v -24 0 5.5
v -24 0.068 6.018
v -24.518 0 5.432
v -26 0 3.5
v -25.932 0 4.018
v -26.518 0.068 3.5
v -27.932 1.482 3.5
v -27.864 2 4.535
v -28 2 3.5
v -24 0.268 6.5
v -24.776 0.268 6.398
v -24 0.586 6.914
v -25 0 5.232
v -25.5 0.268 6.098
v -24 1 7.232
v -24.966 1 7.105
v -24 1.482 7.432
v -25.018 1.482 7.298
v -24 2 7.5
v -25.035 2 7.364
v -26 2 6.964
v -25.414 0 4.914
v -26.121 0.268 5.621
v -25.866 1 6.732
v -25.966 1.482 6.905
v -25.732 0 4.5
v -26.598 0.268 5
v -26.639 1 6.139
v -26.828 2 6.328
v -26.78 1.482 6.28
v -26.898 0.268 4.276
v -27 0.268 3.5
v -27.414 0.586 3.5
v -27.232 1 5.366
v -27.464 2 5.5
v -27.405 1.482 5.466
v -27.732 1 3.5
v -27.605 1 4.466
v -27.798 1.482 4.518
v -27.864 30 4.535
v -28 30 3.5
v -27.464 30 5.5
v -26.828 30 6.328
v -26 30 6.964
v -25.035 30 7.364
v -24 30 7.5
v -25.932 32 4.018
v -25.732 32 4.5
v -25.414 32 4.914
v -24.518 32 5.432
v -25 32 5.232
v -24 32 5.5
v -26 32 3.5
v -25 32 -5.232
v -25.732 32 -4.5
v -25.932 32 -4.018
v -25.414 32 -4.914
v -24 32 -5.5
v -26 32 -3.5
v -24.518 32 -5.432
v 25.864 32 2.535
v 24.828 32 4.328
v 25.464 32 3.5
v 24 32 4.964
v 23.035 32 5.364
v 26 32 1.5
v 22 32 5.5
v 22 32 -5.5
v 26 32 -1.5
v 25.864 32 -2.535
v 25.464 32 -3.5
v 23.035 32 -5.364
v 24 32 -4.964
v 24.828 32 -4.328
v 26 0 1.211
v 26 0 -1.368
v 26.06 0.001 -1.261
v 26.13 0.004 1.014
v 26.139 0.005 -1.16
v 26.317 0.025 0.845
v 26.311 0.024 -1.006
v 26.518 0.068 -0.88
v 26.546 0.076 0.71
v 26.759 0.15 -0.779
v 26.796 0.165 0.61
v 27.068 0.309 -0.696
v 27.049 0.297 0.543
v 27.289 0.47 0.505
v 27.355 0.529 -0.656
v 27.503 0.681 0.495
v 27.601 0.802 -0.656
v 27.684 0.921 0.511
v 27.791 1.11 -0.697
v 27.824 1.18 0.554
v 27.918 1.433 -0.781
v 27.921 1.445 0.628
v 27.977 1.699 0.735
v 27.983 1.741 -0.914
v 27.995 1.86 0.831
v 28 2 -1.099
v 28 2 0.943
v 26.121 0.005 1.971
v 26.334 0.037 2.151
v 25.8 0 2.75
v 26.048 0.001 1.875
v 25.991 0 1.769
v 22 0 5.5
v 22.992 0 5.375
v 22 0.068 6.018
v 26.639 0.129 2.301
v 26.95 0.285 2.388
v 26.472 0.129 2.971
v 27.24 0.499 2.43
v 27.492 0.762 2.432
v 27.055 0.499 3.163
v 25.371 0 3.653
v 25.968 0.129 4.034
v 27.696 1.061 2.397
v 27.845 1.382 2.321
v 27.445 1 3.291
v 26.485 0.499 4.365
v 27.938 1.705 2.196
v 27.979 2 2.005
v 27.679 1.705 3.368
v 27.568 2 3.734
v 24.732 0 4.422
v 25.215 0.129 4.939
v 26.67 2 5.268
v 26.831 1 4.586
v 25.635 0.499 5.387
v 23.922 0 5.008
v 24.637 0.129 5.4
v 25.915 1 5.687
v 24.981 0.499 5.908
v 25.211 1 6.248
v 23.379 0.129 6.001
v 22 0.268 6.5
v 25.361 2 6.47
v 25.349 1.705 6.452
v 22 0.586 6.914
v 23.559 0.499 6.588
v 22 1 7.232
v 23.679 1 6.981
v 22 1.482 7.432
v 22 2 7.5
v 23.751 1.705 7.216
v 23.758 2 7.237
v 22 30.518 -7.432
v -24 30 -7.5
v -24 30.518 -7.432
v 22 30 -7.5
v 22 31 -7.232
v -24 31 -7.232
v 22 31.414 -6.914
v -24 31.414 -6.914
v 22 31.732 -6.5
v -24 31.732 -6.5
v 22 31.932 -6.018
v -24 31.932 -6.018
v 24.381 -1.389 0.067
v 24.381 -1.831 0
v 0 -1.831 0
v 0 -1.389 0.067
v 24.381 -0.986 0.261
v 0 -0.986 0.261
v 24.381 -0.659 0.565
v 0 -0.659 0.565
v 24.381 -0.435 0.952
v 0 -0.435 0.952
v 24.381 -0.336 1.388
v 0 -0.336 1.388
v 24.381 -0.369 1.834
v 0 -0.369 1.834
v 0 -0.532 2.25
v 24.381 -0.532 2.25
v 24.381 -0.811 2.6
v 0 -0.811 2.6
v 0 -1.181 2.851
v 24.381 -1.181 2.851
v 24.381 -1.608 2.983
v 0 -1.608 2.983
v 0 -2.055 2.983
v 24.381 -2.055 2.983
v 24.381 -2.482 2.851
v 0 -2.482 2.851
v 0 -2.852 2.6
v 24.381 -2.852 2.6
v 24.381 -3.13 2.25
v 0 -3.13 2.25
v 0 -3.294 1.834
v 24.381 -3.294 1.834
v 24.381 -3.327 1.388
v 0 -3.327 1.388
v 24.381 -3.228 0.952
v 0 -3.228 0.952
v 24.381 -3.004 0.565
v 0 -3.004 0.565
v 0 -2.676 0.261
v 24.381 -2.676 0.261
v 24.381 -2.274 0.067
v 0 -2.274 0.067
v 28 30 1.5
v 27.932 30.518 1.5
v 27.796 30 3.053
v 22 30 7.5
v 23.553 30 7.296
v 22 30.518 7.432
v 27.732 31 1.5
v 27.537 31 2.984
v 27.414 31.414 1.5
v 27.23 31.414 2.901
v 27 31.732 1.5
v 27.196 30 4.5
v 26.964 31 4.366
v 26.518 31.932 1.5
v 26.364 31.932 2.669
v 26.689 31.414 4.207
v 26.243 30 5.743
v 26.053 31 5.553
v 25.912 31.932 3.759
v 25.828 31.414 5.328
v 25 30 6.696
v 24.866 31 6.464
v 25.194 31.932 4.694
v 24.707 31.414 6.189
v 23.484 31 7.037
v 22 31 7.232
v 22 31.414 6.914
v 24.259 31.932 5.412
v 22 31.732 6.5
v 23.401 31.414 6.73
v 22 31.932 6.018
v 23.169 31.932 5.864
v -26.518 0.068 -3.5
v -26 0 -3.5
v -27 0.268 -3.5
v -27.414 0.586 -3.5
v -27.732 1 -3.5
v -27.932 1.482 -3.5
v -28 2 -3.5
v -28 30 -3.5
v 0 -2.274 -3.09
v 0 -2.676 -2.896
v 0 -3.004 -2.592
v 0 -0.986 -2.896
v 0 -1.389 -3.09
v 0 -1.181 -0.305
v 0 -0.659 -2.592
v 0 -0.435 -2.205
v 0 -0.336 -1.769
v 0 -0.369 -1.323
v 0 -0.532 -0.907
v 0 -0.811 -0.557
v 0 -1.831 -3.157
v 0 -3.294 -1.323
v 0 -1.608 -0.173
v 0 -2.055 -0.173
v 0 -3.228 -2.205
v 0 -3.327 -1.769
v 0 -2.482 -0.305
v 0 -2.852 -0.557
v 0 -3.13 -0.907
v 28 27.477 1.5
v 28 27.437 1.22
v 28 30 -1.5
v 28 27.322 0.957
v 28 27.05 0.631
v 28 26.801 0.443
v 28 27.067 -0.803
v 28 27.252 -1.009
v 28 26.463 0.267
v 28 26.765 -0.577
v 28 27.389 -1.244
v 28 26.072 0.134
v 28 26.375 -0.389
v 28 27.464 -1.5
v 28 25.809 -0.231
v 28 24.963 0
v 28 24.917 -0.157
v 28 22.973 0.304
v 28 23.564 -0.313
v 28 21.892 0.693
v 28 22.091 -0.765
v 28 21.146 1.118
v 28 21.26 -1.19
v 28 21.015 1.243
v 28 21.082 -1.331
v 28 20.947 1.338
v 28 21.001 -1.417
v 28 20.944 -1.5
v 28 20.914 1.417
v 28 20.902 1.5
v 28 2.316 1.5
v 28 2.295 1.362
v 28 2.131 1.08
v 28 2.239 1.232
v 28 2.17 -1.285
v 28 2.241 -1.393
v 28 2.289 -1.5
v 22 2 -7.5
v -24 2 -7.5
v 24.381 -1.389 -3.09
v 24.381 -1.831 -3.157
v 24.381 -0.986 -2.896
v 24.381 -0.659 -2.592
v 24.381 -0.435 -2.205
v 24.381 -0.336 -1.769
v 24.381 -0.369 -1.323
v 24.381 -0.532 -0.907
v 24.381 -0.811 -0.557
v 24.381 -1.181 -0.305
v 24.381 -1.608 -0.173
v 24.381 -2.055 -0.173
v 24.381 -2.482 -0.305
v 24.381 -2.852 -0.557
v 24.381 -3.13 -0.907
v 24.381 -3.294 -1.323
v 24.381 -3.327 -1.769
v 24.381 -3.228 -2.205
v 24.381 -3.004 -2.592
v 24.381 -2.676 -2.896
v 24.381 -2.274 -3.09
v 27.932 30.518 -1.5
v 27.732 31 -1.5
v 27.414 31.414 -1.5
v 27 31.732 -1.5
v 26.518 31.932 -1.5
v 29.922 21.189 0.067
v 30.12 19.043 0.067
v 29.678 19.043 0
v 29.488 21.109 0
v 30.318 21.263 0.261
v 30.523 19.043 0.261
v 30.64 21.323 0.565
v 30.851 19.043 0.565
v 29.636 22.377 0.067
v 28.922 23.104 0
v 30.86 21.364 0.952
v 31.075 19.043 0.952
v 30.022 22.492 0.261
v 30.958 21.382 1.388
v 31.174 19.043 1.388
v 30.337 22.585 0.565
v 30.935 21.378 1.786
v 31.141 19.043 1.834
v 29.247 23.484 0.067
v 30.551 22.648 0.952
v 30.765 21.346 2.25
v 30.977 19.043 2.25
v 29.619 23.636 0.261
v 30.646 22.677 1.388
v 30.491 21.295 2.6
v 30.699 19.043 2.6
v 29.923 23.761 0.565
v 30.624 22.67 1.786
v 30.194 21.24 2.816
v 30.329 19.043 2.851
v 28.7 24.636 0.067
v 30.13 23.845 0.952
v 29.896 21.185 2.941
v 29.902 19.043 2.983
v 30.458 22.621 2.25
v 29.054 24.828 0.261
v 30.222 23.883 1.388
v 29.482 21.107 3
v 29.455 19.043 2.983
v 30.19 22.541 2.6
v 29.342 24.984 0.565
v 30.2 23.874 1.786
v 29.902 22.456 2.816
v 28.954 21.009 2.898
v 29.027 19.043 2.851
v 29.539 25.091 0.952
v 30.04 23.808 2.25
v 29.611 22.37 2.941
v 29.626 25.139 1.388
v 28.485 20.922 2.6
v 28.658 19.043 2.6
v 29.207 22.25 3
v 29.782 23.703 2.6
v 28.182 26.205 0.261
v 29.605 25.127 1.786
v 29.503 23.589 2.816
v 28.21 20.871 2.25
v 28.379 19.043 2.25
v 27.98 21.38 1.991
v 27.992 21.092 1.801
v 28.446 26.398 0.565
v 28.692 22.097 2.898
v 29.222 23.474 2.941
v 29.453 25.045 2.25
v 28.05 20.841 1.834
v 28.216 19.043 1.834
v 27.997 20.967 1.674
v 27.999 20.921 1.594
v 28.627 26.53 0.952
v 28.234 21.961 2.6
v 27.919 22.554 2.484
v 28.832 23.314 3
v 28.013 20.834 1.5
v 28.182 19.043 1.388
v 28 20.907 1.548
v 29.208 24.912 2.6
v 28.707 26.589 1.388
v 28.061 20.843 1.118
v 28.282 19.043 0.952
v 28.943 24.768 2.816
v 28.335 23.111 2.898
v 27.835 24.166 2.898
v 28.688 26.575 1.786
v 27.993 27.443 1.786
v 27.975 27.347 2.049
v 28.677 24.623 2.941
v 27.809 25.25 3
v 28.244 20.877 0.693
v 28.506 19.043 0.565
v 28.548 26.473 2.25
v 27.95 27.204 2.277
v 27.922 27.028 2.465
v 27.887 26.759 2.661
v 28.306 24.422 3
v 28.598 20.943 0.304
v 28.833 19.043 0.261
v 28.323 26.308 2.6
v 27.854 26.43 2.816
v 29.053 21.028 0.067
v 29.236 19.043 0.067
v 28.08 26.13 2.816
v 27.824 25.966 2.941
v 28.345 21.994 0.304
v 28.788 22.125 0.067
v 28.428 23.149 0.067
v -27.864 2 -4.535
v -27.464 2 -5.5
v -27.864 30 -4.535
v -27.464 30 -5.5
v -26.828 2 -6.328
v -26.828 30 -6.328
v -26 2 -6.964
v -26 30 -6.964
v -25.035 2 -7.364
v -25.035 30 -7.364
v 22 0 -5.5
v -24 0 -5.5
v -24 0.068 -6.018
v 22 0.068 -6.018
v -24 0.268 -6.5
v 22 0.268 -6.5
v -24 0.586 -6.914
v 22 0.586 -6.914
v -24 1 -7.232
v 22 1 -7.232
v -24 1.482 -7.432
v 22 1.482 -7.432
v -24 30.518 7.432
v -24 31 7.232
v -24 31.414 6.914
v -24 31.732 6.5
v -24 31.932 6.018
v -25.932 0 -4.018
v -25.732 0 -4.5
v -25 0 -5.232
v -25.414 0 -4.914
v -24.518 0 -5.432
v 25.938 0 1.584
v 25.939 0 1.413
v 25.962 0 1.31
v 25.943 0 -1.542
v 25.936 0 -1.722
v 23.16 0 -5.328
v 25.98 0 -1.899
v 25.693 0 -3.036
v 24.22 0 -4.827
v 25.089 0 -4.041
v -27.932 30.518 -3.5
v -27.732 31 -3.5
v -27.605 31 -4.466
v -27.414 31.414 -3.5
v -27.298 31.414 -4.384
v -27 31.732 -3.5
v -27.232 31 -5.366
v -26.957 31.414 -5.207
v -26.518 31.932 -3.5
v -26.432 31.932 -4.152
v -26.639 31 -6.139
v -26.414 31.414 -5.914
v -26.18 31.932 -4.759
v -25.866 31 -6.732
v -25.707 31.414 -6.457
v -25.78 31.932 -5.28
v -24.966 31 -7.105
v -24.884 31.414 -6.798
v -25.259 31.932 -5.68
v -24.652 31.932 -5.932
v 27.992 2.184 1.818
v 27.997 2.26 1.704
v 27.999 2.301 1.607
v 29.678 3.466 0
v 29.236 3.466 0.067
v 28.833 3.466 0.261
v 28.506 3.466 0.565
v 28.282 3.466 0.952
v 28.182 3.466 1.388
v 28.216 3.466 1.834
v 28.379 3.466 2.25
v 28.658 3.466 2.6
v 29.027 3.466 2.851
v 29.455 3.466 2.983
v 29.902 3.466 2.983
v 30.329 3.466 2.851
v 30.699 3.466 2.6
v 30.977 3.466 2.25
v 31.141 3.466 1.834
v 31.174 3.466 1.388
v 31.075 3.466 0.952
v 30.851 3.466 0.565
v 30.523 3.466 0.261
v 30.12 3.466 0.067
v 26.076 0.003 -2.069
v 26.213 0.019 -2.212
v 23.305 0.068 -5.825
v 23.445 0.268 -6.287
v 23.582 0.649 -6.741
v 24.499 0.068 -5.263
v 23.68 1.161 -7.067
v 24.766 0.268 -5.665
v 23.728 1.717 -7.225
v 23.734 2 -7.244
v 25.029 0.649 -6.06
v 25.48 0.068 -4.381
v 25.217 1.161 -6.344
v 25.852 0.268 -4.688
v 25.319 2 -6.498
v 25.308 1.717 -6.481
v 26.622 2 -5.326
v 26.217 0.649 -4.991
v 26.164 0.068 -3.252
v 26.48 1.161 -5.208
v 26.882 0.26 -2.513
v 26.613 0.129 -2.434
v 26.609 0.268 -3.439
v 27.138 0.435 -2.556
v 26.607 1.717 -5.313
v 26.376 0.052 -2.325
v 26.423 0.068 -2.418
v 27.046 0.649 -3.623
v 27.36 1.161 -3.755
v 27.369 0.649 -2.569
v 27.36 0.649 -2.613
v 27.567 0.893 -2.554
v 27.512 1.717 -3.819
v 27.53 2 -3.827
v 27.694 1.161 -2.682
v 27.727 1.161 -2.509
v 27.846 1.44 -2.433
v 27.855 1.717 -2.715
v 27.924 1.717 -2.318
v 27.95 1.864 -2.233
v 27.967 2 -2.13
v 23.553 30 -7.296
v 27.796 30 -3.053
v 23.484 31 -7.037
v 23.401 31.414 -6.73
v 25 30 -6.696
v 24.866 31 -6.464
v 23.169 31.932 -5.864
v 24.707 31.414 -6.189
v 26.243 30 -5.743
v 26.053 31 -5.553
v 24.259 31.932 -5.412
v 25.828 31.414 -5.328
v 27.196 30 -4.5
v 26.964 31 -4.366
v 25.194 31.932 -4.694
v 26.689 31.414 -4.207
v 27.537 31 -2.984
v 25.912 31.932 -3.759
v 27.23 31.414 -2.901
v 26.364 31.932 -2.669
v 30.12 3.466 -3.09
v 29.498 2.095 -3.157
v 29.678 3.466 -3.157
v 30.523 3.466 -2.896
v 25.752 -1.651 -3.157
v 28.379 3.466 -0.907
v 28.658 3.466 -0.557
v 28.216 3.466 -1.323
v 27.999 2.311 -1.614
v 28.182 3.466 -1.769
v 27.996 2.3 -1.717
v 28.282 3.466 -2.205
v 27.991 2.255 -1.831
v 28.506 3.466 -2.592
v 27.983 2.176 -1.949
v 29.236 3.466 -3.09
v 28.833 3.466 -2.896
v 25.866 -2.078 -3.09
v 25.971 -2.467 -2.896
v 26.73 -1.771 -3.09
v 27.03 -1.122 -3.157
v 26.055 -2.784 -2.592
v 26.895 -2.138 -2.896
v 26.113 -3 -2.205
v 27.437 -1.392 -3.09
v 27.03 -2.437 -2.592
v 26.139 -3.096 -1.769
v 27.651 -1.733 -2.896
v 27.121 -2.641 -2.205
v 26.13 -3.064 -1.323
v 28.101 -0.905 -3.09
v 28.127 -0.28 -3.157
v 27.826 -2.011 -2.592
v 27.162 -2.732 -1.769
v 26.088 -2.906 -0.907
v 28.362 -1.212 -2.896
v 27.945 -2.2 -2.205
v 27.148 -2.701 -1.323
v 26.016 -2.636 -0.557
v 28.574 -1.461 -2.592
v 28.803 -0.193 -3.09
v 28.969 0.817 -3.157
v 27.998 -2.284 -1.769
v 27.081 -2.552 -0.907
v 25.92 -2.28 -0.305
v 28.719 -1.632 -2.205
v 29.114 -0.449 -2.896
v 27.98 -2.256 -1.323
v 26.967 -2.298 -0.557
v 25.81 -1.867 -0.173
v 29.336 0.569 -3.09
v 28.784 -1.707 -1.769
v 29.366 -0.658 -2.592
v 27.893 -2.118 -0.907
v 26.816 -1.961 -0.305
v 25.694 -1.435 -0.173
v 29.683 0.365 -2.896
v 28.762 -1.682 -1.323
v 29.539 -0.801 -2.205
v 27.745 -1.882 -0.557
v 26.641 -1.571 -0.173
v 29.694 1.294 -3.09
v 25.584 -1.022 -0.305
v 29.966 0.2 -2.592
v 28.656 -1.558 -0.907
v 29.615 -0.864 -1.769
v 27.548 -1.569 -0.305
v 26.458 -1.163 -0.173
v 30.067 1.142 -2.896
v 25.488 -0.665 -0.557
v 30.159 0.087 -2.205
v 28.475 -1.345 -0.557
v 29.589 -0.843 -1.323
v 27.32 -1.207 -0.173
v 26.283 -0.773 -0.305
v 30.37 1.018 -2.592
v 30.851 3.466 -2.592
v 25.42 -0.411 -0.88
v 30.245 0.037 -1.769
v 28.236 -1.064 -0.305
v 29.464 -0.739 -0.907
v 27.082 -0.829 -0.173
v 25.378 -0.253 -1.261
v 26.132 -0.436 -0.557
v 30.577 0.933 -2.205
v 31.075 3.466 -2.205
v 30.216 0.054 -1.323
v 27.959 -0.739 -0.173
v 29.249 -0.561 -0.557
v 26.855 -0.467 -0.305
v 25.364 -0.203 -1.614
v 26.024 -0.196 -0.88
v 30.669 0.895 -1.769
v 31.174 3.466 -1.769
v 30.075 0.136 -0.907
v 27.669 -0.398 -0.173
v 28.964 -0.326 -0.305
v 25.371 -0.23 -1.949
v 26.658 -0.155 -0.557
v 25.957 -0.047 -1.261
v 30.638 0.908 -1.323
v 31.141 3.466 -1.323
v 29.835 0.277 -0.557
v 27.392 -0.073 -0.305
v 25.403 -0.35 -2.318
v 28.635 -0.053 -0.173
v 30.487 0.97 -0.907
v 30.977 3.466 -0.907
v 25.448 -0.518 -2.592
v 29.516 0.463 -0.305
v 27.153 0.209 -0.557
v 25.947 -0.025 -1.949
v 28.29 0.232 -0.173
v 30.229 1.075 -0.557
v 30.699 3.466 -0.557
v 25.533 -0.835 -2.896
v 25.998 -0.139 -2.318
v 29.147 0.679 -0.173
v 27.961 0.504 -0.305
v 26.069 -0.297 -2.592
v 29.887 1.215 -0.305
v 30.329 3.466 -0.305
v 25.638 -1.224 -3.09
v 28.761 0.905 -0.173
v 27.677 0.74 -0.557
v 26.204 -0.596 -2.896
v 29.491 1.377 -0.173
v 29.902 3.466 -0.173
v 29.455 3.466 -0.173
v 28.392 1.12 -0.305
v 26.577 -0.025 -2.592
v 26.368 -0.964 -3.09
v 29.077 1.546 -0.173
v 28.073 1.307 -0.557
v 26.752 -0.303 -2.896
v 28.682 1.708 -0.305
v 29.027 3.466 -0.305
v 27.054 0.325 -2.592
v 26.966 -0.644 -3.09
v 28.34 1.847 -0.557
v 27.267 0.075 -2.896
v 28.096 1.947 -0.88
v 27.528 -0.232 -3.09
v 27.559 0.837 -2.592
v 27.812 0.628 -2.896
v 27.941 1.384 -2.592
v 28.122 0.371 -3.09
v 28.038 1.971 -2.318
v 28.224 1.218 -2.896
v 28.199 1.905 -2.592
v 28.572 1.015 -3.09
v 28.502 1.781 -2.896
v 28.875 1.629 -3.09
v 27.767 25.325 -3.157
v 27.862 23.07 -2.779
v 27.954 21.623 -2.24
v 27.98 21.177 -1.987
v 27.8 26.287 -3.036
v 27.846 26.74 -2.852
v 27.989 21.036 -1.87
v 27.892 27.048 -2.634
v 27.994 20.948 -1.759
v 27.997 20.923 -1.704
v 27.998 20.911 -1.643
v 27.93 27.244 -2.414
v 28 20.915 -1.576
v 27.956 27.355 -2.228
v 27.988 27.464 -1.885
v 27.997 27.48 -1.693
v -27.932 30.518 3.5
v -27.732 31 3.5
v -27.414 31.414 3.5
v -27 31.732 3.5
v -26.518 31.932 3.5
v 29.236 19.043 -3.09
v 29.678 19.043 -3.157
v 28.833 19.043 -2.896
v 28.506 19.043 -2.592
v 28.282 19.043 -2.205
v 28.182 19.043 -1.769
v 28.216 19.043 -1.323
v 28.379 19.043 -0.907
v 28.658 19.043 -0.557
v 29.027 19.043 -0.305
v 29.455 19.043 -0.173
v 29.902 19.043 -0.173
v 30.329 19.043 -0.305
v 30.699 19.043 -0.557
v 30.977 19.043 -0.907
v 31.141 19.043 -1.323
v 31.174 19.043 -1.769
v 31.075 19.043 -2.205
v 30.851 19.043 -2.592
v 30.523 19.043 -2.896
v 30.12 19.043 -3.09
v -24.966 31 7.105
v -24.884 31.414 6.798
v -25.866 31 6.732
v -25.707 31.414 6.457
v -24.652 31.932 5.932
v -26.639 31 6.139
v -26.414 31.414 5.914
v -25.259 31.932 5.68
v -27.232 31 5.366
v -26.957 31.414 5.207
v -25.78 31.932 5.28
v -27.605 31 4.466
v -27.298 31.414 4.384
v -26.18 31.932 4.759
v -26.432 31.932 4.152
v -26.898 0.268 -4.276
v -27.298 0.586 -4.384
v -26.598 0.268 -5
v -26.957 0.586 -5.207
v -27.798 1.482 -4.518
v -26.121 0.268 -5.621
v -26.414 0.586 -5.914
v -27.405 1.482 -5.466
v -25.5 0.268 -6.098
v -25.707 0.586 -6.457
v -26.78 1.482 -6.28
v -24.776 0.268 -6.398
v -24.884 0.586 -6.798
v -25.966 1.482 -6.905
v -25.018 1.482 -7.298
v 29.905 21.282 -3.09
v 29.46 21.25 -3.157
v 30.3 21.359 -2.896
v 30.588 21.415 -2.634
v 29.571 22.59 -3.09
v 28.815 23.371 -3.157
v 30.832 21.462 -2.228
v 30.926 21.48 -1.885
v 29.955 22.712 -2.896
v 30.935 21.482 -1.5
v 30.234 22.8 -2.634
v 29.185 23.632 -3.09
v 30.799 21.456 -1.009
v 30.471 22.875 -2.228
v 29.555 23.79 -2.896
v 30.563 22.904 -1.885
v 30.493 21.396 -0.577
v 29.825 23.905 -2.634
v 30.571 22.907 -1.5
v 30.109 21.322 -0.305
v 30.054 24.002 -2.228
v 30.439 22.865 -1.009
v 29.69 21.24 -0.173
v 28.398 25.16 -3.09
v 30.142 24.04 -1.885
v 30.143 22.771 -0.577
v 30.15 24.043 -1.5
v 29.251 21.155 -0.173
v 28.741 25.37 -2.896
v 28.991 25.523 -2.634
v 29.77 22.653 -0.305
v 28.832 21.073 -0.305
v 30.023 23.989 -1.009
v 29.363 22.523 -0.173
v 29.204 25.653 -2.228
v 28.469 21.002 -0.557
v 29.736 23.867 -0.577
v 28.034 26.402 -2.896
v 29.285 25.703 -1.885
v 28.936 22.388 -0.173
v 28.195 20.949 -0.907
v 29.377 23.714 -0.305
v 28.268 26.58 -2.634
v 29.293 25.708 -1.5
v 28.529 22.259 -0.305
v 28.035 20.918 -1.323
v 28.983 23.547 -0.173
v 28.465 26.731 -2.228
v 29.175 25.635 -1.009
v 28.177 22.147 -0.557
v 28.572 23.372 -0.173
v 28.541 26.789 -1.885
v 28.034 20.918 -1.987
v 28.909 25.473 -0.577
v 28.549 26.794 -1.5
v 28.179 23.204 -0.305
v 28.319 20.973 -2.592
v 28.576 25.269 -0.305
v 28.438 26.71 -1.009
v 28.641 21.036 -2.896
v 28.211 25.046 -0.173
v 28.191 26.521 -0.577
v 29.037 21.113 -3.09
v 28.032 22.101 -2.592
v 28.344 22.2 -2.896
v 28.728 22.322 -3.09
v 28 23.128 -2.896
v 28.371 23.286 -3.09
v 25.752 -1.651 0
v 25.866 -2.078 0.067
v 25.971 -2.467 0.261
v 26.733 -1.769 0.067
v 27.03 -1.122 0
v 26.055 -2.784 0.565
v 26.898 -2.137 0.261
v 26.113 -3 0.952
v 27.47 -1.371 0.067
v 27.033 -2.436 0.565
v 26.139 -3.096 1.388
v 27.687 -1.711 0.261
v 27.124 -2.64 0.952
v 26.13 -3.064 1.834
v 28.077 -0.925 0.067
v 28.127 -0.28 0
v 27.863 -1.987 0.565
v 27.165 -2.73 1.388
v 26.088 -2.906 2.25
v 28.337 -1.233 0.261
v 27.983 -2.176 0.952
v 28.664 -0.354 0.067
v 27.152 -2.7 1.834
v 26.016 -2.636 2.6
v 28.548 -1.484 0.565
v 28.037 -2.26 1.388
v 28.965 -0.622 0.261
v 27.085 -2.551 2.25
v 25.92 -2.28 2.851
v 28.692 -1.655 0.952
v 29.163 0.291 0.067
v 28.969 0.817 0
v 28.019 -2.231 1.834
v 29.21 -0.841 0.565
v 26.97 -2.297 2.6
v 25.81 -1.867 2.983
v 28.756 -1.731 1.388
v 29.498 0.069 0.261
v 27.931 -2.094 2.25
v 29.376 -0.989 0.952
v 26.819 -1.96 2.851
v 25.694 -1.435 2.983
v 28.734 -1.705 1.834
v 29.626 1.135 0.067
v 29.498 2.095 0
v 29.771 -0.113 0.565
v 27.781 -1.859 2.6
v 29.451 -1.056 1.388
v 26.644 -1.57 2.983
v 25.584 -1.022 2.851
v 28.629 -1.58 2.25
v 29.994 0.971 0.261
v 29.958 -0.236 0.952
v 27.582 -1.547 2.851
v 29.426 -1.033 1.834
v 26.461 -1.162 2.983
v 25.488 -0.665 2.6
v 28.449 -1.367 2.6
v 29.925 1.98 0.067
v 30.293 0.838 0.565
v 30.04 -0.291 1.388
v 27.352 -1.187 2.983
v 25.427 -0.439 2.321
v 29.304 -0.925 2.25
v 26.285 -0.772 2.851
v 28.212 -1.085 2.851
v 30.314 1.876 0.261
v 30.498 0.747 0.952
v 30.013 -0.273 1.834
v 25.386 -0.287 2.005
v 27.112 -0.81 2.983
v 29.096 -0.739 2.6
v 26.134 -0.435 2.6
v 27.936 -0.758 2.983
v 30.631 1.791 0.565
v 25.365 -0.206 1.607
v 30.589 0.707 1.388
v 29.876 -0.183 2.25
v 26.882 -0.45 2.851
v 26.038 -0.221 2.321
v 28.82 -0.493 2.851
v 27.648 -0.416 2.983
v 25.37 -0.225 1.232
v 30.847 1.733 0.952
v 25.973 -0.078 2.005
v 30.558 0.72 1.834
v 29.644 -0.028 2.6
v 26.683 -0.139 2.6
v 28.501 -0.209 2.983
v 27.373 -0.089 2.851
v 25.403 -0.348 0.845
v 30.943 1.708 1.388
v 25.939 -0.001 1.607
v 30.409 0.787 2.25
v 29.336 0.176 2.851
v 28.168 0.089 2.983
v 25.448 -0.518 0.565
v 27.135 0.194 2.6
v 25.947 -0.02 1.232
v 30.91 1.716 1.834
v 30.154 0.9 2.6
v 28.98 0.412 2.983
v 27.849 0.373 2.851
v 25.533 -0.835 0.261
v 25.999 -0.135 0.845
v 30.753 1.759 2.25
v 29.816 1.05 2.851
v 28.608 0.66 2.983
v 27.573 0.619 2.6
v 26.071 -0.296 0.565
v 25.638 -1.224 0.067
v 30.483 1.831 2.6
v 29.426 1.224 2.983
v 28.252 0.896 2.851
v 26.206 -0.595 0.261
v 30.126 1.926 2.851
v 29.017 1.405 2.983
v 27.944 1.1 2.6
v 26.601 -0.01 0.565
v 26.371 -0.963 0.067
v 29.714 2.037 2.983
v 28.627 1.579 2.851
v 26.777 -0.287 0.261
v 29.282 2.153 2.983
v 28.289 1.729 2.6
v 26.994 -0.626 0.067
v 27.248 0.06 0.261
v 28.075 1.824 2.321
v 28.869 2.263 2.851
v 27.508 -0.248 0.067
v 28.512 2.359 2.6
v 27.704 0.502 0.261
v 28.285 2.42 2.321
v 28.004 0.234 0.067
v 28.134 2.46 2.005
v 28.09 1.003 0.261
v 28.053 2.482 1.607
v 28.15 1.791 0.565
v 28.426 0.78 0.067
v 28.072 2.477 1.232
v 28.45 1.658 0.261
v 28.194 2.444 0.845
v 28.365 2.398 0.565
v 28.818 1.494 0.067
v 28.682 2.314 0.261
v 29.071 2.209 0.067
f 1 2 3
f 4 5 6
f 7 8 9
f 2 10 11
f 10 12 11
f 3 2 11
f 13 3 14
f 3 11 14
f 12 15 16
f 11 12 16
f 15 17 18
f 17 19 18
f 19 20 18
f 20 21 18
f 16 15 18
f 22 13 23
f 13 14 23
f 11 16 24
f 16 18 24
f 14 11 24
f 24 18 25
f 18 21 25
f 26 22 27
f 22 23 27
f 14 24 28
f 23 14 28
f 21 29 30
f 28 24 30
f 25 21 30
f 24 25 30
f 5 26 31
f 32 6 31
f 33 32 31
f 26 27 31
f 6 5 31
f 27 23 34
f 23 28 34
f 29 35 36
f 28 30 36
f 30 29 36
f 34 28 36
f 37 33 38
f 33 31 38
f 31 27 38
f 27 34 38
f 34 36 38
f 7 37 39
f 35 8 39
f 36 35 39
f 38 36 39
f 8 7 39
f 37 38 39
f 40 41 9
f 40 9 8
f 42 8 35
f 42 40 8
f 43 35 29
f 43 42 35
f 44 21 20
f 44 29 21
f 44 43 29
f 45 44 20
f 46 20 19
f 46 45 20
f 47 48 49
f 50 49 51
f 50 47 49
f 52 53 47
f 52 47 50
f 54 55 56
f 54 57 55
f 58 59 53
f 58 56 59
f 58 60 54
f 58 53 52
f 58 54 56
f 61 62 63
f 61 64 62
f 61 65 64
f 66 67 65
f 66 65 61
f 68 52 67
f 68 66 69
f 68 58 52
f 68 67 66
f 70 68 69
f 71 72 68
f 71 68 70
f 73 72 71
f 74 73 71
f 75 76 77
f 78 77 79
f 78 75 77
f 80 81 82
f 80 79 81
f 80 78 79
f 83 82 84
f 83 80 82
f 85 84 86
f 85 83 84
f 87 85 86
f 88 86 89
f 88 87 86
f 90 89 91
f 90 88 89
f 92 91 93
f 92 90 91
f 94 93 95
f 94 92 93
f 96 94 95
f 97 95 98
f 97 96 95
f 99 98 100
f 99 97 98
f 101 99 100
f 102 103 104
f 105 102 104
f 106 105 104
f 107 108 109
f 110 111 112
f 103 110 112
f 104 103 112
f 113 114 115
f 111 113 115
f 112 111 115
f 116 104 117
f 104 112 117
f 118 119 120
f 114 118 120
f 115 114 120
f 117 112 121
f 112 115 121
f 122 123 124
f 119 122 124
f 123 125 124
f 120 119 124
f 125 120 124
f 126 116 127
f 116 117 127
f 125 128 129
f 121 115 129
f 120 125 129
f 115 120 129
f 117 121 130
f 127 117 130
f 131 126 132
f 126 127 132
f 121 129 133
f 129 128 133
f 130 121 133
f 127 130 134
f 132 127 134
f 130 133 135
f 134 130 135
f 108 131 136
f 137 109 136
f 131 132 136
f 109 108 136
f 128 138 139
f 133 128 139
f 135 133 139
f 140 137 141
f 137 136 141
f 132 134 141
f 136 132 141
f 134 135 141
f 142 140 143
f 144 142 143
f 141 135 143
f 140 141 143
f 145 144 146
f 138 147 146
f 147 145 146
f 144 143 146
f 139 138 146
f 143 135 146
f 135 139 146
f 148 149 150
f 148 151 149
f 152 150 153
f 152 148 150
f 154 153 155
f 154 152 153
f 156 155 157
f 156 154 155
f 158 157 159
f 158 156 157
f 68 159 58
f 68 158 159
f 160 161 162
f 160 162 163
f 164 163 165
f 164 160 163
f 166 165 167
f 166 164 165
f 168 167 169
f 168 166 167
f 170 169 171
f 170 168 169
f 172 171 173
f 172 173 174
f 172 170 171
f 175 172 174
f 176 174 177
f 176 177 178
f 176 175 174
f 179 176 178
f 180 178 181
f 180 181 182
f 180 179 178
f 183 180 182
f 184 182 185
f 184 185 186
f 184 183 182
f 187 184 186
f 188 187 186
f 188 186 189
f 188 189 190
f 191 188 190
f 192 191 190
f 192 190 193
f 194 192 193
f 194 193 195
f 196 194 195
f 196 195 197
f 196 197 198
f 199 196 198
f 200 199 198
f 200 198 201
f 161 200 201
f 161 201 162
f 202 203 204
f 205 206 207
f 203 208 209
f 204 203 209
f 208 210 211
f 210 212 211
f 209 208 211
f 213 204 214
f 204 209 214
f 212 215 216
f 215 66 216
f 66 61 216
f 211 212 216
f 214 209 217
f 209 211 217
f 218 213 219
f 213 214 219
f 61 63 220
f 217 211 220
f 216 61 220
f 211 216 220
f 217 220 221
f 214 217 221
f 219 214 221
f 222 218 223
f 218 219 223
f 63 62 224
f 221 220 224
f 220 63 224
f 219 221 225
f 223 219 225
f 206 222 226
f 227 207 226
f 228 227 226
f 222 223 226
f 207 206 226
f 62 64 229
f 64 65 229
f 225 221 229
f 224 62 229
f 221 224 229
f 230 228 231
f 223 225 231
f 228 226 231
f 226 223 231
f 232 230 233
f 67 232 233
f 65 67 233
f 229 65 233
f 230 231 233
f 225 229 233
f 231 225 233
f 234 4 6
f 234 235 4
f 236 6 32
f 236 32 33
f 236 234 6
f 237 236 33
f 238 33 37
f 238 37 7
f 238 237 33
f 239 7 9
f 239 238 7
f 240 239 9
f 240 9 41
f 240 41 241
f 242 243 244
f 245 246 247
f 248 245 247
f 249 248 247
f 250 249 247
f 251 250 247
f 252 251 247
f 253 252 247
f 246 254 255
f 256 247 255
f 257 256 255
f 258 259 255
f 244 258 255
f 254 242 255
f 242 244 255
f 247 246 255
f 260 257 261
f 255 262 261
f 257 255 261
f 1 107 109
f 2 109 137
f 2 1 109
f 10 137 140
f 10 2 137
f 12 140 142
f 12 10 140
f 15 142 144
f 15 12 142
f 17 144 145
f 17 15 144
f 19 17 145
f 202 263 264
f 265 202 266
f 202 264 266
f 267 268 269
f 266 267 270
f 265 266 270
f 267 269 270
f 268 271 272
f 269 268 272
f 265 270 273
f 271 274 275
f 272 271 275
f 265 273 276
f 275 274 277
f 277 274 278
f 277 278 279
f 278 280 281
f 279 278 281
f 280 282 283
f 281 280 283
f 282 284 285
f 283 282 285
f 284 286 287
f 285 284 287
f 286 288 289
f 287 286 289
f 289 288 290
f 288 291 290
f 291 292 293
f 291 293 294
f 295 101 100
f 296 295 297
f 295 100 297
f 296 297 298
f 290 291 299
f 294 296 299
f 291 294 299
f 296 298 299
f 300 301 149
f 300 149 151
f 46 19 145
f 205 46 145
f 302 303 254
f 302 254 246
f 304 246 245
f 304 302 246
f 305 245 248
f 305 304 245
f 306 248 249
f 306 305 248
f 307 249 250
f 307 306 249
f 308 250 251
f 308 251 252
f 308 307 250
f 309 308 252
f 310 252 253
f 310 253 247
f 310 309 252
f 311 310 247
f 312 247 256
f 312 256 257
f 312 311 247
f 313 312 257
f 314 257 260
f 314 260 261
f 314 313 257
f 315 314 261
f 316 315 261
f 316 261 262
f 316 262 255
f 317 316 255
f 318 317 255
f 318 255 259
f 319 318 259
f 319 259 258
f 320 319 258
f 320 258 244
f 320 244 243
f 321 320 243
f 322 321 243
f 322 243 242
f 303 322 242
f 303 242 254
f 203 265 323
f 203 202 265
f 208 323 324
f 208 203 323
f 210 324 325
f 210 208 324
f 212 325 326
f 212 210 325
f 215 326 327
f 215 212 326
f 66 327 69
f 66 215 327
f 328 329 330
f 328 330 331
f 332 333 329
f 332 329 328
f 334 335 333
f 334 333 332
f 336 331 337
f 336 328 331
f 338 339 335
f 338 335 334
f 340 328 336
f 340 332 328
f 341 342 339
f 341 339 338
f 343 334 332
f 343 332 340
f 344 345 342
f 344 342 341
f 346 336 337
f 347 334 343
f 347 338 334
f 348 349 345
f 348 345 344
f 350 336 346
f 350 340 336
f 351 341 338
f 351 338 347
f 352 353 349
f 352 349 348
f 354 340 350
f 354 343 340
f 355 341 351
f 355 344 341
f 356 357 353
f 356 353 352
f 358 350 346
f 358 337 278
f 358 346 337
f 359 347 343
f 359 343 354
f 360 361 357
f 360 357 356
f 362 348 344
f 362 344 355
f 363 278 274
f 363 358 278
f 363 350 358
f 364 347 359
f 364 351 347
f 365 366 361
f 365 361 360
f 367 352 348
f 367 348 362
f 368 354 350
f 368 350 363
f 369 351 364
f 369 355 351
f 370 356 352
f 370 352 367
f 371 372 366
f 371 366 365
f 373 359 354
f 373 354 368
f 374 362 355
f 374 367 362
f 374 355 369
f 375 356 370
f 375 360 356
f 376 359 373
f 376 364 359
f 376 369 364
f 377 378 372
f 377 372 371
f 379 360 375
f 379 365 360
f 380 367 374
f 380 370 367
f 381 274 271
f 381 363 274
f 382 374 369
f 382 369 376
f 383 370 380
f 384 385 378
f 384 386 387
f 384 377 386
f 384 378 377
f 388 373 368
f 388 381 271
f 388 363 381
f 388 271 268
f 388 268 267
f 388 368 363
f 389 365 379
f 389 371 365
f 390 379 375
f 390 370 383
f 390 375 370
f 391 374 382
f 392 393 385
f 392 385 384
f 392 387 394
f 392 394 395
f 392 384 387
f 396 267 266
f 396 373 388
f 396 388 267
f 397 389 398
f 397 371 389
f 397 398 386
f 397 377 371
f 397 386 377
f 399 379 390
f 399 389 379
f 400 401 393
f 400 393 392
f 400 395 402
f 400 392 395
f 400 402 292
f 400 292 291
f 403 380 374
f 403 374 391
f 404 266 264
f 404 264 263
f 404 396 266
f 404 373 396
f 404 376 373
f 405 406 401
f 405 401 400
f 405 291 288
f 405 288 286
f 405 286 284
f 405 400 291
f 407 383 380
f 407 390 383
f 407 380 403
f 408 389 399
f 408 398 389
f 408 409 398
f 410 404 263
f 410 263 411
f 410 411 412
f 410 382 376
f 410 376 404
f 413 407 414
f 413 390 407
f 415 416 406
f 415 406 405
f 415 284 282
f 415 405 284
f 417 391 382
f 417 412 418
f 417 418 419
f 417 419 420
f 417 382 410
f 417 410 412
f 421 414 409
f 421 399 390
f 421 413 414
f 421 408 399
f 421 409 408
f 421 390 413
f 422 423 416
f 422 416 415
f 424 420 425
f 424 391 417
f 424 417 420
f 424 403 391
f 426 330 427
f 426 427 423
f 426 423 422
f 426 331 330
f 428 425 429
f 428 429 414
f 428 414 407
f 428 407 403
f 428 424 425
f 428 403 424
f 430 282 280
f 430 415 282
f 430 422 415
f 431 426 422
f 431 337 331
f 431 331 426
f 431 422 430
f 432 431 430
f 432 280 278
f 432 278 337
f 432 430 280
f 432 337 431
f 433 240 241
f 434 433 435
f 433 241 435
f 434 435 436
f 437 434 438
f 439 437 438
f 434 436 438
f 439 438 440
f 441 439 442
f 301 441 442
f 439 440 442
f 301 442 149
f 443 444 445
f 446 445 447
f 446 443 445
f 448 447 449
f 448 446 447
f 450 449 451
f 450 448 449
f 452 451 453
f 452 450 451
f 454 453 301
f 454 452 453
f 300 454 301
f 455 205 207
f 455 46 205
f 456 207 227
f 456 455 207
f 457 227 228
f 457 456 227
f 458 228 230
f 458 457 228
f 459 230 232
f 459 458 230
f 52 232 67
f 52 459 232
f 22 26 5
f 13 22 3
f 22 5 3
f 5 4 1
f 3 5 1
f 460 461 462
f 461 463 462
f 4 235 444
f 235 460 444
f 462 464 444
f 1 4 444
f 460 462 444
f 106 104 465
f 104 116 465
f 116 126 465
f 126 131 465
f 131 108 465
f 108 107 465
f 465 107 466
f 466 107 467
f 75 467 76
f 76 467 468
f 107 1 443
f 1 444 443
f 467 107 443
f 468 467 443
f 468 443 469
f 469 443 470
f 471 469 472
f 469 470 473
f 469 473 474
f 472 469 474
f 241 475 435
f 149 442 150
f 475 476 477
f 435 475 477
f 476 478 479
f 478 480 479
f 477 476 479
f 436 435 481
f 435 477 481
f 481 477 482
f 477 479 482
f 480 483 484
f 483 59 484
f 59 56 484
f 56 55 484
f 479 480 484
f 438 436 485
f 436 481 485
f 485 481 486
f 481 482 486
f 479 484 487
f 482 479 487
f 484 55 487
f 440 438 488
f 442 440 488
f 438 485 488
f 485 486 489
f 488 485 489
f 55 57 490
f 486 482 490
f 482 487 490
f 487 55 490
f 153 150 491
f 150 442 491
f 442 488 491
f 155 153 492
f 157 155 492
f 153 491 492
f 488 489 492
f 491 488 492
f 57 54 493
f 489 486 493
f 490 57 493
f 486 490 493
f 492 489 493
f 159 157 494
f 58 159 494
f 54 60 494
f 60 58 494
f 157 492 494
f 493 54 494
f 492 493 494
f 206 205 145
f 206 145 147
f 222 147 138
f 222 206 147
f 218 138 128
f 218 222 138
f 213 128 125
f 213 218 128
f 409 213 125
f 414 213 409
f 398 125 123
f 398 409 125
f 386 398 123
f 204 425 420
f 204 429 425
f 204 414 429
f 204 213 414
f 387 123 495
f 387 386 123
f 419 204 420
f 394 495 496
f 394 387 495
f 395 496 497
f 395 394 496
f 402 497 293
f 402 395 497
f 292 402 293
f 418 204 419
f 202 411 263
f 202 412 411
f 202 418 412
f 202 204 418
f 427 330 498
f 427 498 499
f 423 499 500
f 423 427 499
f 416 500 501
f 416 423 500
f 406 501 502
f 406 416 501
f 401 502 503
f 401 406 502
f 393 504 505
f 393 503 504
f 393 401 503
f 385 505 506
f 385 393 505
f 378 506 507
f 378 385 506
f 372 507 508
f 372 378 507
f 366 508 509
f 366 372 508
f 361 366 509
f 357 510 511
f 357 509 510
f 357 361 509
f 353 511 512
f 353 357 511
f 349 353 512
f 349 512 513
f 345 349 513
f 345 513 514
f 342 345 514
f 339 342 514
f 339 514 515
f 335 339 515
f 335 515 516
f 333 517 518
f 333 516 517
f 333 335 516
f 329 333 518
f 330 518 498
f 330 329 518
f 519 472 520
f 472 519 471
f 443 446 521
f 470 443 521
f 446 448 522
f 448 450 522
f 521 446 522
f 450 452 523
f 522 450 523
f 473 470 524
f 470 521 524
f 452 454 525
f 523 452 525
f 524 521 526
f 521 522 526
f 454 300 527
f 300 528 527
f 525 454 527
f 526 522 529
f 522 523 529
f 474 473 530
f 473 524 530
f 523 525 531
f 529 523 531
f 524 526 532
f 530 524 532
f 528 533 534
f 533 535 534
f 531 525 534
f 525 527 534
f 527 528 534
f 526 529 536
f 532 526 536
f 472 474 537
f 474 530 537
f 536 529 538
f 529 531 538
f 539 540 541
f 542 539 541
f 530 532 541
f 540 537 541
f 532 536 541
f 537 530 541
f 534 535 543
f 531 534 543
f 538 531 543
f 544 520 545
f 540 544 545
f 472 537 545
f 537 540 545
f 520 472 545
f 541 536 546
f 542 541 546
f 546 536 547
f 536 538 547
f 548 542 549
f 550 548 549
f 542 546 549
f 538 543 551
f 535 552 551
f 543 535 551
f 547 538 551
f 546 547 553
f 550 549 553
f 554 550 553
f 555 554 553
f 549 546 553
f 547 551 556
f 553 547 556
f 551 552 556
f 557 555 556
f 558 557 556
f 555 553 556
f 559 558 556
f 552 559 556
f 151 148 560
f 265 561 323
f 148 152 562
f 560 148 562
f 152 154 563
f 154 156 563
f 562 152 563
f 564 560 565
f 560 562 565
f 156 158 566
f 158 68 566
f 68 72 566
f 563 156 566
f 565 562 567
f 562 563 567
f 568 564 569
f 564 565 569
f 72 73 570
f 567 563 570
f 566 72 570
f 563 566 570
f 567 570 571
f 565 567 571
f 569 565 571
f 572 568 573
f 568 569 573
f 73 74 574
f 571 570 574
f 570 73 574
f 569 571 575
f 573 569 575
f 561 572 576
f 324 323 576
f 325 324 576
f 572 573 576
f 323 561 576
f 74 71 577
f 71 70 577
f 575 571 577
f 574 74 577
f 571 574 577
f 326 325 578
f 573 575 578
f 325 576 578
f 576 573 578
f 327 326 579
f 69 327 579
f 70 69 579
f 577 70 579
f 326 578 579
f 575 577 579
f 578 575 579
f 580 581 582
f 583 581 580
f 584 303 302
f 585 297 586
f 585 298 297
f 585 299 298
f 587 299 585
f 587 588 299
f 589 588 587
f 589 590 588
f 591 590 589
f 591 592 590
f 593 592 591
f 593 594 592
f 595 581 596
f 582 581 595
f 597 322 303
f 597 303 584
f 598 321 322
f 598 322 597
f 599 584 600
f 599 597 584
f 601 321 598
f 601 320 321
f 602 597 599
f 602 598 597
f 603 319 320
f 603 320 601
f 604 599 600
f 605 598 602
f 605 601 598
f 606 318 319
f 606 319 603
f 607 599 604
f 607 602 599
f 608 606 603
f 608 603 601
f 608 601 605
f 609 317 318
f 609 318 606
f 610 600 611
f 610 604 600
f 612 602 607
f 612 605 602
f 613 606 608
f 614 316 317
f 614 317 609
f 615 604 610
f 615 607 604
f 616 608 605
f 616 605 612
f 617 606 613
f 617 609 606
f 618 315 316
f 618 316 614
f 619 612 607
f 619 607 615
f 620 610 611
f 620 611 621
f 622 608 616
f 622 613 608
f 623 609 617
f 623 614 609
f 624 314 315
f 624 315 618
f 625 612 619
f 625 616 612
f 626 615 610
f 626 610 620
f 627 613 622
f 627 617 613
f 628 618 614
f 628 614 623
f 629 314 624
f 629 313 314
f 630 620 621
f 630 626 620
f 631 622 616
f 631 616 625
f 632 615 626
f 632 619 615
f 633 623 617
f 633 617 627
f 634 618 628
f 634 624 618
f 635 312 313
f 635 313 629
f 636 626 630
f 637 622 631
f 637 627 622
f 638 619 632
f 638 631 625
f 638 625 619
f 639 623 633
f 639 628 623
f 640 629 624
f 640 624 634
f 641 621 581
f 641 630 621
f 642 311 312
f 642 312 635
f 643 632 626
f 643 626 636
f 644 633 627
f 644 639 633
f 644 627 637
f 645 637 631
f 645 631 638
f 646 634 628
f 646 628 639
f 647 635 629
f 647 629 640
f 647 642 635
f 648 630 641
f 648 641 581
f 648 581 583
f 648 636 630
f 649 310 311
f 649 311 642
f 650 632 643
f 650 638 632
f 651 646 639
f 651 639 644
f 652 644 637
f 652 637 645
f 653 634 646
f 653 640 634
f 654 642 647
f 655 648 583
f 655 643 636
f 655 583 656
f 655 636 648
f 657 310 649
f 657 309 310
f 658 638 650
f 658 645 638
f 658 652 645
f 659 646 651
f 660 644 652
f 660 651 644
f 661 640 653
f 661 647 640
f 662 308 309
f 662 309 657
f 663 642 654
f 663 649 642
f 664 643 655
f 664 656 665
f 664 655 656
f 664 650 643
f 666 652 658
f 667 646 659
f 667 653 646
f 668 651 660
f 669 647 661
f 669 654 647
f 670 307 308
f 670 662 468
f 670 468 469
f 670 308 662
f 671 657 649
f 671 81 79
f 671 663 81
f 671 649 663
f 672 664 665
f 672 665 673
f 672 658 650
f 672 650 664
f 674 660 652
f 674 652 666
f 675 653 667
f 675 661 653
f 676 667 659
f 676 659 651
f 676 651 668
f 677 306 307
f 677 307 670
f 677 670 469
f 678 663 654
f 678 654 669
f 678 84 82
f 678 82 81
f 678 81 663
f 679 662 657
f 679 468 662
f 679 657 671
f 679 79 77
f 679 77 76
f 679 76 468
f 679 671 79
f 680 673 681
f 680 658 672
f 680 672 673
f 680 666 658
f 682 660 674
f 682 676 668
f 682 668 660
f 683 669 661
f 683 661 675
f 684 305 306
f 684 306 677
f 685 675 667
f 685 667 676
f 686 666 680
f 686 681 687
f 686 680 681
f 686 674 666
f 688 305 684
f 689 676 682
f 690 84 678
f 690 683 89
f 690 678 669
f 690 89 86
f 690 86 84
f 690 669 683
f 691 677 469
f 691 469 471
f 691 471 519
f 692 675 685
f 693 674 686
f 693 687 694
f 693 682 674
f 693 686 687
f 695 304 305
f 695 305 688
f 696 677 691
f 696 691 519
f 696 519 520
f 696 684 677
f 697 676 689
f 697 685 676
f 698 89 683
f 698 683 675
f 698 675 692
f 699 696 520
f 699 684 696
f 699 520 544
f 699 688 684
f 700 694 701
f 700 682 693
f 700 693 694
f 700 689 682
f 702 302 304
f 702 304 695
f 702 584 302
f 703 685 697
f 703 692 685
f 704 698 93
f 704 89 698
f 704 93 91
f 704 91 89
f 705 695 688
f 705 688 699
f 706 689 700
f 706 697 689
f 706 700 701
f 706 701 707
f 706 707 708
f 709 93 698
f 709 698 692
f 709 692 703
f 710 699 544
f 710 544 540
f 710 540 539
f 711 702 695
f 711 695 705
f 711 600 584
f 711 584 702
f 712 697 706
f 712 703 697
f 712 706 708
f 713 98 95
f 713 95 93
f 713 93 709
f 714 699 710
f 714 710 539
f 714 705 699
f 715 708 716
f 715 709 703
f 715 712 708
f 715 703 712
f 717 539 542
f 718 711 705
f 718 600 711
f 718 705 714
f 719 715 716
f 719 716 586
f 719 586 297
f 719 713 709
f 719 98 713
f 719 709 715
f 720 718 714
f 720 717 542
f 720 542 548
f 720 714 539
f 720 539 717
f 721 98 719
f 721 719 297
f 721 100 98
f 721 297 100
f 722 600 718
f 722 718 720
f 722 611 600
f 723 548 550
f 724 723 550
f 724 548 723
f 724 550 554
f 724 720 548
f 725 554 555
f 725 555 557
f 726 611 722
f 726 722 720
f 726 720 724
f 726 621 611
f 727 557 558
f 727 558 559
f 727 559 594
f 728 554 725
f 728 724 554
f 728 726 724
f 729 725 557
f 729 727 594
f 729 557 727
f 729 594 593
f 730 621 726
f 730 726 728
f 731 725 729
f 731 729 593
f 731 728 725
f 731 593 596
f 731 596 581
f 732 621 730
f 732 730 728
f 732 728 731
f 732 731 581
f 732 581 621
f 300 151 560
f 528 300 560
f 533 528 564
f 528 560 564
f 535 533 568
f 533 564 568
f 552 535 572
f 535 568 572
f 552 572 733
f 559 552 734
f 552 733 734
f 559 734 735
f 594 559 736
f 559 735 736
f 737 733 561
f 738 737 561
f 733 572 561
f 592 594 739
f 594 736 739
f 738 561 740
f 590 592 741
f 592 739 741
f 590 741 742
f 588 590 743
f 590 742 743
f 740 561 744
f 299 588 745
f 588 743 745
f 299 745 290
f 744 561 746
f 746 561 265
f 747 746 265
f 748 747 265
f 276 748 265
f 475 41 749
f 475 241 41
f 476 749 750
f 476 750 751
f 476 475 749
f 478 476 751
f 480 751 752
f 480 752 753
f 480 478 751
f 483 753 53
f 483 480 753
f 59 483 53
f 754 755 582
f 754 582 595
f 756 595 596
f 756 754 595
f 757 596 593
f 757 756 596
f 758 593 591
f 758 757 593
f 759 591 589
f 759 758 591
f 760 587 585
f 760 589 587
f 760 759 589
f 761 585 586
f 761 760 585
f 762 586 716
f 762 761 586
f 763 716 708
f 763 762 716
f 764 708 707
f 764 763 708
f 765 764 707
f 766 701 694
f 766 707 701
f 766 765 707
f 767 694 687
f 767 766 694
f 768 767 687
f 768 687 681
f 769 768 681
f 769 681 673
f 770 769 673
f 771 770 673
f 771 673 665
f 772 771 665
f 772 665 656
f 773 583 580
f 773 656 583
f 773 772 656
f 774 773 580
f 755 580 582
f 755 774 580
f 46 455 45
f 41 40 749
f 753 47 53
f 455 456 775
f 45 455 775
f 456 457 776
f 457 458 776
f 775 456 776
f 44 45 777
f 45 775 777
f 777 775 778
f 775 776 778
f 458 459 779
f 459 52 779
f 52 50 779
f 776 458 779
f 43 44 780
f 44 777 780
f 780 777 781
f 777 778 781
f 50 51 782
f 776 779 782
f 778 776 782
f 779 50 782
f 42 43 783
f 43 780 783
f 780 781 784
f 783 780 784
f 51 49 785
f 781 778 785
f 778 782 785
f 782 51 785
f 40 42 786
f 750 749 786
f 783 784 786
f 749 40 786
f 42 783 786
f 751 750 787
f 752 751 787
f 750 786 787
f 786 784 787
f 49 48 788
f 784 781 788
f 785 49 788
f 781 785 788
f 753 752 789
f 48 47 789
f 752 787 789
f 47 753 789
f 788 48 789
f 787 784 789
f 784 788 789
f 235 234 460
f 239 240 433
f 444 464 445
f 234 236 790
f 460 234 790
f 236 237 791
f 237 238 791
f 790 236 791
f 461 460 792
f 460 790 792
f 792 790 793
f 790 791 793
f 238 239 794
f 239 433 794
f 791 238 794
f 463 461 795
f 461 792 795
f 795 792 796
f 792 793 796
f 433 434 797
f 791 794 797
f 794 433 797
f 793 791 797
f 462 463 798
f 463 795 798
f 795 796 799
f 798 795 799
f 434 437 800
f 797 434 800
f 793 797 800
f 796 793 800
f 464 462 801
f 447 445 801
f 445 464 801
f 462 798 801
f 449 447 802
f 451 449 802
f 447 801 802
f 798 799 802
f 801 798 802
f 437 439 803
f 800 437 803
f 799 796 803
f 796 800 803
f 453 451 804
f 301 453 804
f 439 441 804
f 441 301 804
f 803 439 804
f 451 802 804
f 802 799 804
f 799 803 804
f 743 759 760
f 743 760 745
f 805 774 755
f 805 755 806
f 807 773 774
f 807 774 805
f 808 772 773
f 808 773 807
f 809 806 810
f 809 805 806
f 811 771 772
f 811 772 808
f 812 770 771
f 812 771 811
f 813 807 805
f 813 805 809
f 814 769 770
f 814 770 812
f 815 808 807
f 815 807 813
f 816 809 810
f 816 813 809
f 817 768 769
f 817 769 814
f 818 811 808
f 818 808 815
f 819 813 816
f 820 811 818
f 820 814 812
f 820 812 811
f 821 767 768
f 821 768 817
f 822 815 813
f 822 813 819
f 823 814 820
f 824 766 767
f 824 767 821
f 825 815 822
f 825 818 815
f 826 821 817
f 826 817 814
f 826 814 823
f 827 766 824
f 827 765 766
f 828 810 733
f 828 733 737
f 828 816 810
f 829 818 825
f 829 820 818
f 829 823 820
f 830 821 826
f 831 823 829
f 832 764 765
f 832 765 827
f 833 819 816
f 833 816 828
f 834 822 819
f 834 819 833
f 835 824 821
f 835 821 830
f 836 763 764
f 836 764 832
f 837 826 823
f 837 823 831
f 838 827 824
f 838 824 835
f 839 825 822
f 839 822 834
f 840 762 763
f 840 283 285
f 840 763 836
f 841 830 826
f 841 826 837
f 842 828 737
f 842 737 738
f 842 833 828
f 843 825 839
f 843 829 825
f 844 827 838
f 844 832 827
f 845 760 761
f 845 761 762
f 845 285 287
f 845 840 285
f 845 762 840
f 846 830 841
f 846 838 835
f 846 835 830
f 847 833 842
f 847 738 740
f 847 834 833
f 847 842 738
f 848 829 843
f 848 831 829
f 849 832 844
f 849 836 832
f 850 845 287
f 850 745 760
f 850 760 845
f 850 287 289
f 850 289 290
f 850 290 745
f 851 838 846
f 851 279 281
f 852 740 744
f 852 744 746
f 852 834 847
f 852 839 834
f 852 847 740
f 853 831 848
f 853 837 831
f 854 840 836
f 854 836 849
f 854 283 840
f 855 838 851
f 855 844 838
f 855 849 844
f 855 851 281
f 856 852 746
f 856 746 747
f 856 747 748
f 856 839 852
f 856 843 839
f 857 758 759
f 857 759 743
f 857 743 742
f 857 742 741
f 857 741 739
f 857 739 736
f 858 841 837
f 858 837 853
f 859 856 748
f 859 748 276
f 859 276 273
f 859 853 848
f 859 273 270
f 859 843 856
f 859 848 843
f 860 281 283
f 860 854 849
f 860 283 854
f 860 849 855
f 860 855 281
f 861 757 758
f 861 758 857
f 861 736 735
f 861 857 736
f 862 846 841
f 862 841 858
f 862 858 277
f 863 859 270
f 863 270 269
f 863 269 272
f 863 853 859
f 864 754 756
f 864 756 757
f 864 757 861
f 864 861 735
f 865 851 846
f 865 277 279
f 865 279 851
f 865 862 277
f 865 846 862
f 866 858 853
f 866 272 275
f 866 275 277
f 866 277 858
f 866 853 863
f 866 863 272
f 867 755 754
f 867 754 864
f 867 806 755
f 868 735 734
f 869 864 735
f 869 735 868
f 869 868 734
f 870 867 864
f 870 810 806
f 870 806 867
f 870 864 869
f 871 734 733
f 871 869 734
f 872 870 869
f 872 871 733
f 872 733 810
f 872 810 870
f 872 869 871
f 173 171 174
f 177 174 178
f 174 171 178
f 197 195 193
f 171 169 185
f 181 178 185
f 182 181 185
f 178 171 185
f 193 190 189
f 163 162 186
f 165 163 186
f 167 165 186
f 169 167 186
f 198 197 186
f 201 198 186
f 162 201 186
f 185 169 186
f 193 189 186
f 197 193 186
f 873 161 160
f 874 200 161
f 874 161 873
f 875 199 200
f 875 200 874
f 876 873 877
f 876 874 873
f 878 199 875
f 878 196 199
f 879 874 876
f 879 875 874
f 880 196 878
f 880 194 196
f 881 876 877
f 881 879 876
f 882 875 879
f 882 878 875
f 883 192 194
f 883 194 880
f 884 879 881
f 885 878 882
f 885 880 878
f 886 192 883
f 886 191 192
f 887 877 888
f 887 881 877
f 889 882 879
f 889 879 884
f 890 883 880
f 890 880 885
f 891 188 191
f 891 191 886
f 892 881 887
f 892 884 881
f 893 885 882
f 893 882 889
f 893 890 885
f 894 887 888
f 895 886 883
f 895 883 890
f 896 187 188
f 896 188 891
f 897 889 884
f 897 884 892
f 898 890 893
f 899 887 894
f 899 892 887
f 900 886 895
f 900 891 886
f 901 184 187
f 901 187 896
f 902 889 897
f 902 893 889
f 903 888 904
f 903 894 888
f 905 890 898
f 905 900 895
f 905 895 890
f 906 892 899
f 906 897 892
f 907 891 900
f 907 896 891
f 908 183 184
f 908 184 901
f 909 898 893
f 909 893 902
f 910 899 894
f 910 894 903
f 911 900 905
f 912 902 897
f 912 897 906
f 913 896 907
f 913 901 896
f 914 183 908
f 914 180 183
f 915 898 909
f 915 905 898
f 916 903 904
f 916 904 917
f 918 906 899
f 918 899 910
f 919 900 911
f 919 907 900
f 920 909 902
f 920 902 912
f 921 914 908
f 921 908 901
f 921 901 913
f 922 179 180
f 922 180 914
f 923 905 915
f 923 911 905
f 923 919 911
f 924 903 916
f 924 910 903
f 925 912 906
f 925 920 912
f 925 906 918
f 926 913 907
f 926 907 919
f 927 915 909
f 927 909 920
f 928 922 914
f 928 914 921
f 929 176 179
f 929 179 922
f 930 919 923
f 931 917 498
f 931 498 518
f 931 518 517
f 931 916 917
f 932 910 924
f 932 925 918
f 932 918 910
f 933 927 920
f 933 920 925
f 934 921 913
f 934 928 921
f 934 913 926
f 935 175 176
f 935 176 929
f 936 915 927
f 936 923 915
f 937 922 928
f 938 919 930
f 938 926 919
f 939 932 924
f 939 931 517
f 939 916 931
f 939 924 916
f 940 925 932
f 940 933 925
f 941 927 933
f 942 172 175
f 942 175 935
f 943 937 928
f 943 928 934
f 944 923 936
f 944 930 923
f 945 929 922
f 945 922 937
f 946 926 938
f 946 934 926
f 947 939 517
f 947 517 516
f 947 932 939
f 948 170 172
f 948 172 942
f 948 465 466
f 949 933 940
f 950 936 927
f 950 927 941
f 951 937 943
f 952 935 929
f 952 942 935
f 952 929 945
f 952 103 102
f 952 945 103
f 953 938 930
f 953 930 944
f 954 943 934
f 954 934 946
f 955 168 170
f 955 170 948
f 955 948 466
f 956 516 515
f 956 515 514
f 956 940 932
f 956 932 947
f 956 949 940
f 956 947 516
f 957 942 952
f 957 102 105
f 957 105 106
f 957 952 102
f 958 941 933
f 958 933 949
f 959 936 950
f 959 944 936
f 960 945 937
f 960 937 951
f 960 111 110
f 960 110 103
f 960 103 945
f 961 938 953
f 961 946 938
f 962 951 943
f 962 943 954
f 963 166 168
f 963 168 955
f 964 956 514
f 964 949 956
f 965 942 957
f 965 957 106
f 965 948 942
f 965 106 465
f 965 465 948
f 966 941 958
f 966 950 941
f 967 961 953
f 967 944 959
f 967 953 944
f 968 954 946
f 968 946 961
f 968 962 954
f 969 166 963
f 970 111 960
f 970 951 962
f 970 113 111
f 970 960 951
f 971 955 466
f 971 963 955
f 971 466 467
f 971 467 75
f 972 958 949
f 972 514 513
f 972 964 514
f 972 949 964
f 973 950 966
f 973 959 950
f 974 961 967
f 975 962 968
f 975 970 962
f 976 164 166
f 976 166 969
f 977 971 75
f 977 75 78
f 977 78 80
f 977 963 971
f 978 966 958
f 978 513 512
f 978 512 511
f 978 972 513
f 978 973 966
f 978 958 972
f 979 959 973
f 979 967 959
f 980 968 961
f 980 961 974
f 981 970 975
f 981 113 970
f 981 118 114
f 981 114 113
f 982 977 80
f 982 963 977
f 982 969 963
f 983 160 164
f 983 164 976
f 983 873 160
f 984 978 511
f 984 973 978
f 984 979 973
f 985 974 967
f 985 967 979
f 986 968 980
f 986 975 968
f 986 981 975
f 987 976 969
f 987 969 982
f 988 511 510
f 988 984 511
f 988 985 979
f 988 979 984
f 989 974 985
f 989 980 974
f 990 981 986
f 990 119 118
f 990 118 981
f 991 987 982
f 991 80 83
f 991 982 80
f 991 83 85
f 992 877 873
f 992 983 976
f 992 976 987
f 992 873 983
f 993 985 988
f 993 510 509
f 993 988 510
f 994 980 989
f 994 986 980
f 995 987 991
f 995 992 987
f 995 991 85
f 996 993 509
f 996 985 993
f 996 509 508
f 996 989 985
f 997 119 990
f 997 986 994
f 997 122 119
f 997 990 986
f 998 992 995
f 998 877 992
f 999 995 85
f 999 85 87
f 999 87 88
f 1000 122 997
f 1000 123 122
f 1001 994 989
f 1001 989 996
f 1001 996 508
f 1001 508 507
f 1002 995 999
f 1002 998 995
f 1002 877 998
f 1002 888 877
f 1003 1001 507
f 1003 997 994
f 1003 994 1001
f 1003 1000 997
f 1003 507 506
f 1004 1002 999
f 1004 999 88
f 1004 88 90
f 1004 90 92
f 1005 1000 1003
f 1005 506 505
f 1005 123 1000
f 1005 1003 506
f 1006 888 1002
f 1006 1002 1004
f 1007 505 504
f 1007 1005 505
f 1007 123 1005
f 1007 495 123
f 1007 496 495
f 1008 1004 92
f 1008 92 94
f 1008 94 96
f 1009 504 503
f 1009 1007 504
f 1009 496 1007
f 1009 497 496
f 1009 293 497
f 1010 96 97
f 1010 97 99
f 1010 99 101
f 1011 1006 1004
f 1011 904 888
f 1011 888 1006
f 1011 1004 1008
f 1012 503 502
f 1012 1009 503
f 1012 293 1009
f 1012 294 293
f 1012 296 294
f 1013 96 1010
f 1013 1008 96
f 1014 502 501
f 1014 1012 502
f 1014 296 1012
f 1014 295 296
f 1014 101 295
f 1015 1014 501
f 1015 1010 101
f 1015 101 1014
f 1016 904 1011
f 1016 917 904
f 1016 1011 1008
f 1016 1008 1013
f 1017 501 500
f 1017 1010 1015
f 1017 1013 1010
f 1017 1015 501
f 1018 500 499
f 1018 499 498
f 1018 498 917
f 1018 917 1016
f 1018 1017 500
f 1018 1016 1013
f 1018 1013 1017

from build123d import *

# Parameters (mm, degrees)
SKETCH1_W           = 56
SKETCH1_H           = 15
BOSS_EXTRUDE1_DEPTH = 32
FILLET1_R           = 4
FILLET2_R           = 6
FILLET3_R           = 2
SKETCH4_R           = 1.5


with BuildPart() as part:
    # Sketch1 → Boss-Extrude1 (new body)
    with BuildSketch(Plane(origin=(0, 0, 0), x_dir=(1, 0, 0), z_dir=(0, 1, 0))):
        Rectangle(SKETCH1_W, SKETCH1_H)
    extrude(amount=BOSS_EXTRUDE1_DEPTH)

    # Fillet1
    fillet1_edges = [part.edges().sort_by_distance(p)[0] for p in [
        (-28, 16, 7.5),
        (-28, 16, -7.5),
    ]]
    fillet(fillet1_edges, radius=FILLET1_R)

    # Fillet2
    fillet2_edges = [part.edges().sort_by_distance(p)[0] for p in [
        (28, 16, 7.5),
        (28, 16, -7.5),
    ]]
    fillet(fillet2_edges, radius=FILLET2_R)

    # Fillet3
    fillet3_edges = [part.edges().sort_by_distance(p)[0] for p in [
        (-28, 0, 0),
        (-28, 32, 0),
        (-1, 0, 7.5),
        (-26.828427125, 0, 6.328427125),
        (-26.828427125, 0, -6.328427125),
        (-1, 32, 7.5),
        (-26.828427125, 32, 6.328427125),
        (-26.828427125, 32, -6.328427125),
        (-1, 0, -7.5),
        (-1, 32, -7.5),
        (28, 0, 0),
        (26.242640687, 0, 5.742640687),
        (26.242640687, 0, -5.742640687),
        (28, 32, 0),
        (26.242640687, 32, 5.742640687),
        (26.242640687, 32, -5.742640687),
    ]]
    fillet(fillet3_edges, radius=FILLET3_R)

    # Sweep2: sweep along a path in Sketch3
    with BuildLine(Plane(origin=(0, 0, -7.5), x_dir=(-1, 0, 0), z_dir=(0, 0, -1))) as sweep2_path:
        Line((0, -2.523571647), (-24.380909243, -2.523571647))
        ThreePointArc((-24.380909243, -2.523571647), (-28.616108457, -0.769294693), (-30.370385411, 3.465904521))
        Line((-30.370385411, 3.465904521), (-30.370385411, 19.042947176))
        ThreePointArc((-30.370385411, 19.042947176), (-28.424943012, 25.584575861), (-23.220936705, 30))
    # Sketch4 → Sweep2 (sweep)
    with BuildSketch(Plane(origin=(0, 0, 0), x_dir=(0, 0, -1), z_dir=(1, 0, 0))):
        with Locations((1.656570637, -1.831459883)):
            Circle(SKETCH4_R)
        with Locations((-1.5, -1.831459883)):
            Circle(SKETCH4_R)
    sweep(path=sweep2_path.line)


solid = part.part
